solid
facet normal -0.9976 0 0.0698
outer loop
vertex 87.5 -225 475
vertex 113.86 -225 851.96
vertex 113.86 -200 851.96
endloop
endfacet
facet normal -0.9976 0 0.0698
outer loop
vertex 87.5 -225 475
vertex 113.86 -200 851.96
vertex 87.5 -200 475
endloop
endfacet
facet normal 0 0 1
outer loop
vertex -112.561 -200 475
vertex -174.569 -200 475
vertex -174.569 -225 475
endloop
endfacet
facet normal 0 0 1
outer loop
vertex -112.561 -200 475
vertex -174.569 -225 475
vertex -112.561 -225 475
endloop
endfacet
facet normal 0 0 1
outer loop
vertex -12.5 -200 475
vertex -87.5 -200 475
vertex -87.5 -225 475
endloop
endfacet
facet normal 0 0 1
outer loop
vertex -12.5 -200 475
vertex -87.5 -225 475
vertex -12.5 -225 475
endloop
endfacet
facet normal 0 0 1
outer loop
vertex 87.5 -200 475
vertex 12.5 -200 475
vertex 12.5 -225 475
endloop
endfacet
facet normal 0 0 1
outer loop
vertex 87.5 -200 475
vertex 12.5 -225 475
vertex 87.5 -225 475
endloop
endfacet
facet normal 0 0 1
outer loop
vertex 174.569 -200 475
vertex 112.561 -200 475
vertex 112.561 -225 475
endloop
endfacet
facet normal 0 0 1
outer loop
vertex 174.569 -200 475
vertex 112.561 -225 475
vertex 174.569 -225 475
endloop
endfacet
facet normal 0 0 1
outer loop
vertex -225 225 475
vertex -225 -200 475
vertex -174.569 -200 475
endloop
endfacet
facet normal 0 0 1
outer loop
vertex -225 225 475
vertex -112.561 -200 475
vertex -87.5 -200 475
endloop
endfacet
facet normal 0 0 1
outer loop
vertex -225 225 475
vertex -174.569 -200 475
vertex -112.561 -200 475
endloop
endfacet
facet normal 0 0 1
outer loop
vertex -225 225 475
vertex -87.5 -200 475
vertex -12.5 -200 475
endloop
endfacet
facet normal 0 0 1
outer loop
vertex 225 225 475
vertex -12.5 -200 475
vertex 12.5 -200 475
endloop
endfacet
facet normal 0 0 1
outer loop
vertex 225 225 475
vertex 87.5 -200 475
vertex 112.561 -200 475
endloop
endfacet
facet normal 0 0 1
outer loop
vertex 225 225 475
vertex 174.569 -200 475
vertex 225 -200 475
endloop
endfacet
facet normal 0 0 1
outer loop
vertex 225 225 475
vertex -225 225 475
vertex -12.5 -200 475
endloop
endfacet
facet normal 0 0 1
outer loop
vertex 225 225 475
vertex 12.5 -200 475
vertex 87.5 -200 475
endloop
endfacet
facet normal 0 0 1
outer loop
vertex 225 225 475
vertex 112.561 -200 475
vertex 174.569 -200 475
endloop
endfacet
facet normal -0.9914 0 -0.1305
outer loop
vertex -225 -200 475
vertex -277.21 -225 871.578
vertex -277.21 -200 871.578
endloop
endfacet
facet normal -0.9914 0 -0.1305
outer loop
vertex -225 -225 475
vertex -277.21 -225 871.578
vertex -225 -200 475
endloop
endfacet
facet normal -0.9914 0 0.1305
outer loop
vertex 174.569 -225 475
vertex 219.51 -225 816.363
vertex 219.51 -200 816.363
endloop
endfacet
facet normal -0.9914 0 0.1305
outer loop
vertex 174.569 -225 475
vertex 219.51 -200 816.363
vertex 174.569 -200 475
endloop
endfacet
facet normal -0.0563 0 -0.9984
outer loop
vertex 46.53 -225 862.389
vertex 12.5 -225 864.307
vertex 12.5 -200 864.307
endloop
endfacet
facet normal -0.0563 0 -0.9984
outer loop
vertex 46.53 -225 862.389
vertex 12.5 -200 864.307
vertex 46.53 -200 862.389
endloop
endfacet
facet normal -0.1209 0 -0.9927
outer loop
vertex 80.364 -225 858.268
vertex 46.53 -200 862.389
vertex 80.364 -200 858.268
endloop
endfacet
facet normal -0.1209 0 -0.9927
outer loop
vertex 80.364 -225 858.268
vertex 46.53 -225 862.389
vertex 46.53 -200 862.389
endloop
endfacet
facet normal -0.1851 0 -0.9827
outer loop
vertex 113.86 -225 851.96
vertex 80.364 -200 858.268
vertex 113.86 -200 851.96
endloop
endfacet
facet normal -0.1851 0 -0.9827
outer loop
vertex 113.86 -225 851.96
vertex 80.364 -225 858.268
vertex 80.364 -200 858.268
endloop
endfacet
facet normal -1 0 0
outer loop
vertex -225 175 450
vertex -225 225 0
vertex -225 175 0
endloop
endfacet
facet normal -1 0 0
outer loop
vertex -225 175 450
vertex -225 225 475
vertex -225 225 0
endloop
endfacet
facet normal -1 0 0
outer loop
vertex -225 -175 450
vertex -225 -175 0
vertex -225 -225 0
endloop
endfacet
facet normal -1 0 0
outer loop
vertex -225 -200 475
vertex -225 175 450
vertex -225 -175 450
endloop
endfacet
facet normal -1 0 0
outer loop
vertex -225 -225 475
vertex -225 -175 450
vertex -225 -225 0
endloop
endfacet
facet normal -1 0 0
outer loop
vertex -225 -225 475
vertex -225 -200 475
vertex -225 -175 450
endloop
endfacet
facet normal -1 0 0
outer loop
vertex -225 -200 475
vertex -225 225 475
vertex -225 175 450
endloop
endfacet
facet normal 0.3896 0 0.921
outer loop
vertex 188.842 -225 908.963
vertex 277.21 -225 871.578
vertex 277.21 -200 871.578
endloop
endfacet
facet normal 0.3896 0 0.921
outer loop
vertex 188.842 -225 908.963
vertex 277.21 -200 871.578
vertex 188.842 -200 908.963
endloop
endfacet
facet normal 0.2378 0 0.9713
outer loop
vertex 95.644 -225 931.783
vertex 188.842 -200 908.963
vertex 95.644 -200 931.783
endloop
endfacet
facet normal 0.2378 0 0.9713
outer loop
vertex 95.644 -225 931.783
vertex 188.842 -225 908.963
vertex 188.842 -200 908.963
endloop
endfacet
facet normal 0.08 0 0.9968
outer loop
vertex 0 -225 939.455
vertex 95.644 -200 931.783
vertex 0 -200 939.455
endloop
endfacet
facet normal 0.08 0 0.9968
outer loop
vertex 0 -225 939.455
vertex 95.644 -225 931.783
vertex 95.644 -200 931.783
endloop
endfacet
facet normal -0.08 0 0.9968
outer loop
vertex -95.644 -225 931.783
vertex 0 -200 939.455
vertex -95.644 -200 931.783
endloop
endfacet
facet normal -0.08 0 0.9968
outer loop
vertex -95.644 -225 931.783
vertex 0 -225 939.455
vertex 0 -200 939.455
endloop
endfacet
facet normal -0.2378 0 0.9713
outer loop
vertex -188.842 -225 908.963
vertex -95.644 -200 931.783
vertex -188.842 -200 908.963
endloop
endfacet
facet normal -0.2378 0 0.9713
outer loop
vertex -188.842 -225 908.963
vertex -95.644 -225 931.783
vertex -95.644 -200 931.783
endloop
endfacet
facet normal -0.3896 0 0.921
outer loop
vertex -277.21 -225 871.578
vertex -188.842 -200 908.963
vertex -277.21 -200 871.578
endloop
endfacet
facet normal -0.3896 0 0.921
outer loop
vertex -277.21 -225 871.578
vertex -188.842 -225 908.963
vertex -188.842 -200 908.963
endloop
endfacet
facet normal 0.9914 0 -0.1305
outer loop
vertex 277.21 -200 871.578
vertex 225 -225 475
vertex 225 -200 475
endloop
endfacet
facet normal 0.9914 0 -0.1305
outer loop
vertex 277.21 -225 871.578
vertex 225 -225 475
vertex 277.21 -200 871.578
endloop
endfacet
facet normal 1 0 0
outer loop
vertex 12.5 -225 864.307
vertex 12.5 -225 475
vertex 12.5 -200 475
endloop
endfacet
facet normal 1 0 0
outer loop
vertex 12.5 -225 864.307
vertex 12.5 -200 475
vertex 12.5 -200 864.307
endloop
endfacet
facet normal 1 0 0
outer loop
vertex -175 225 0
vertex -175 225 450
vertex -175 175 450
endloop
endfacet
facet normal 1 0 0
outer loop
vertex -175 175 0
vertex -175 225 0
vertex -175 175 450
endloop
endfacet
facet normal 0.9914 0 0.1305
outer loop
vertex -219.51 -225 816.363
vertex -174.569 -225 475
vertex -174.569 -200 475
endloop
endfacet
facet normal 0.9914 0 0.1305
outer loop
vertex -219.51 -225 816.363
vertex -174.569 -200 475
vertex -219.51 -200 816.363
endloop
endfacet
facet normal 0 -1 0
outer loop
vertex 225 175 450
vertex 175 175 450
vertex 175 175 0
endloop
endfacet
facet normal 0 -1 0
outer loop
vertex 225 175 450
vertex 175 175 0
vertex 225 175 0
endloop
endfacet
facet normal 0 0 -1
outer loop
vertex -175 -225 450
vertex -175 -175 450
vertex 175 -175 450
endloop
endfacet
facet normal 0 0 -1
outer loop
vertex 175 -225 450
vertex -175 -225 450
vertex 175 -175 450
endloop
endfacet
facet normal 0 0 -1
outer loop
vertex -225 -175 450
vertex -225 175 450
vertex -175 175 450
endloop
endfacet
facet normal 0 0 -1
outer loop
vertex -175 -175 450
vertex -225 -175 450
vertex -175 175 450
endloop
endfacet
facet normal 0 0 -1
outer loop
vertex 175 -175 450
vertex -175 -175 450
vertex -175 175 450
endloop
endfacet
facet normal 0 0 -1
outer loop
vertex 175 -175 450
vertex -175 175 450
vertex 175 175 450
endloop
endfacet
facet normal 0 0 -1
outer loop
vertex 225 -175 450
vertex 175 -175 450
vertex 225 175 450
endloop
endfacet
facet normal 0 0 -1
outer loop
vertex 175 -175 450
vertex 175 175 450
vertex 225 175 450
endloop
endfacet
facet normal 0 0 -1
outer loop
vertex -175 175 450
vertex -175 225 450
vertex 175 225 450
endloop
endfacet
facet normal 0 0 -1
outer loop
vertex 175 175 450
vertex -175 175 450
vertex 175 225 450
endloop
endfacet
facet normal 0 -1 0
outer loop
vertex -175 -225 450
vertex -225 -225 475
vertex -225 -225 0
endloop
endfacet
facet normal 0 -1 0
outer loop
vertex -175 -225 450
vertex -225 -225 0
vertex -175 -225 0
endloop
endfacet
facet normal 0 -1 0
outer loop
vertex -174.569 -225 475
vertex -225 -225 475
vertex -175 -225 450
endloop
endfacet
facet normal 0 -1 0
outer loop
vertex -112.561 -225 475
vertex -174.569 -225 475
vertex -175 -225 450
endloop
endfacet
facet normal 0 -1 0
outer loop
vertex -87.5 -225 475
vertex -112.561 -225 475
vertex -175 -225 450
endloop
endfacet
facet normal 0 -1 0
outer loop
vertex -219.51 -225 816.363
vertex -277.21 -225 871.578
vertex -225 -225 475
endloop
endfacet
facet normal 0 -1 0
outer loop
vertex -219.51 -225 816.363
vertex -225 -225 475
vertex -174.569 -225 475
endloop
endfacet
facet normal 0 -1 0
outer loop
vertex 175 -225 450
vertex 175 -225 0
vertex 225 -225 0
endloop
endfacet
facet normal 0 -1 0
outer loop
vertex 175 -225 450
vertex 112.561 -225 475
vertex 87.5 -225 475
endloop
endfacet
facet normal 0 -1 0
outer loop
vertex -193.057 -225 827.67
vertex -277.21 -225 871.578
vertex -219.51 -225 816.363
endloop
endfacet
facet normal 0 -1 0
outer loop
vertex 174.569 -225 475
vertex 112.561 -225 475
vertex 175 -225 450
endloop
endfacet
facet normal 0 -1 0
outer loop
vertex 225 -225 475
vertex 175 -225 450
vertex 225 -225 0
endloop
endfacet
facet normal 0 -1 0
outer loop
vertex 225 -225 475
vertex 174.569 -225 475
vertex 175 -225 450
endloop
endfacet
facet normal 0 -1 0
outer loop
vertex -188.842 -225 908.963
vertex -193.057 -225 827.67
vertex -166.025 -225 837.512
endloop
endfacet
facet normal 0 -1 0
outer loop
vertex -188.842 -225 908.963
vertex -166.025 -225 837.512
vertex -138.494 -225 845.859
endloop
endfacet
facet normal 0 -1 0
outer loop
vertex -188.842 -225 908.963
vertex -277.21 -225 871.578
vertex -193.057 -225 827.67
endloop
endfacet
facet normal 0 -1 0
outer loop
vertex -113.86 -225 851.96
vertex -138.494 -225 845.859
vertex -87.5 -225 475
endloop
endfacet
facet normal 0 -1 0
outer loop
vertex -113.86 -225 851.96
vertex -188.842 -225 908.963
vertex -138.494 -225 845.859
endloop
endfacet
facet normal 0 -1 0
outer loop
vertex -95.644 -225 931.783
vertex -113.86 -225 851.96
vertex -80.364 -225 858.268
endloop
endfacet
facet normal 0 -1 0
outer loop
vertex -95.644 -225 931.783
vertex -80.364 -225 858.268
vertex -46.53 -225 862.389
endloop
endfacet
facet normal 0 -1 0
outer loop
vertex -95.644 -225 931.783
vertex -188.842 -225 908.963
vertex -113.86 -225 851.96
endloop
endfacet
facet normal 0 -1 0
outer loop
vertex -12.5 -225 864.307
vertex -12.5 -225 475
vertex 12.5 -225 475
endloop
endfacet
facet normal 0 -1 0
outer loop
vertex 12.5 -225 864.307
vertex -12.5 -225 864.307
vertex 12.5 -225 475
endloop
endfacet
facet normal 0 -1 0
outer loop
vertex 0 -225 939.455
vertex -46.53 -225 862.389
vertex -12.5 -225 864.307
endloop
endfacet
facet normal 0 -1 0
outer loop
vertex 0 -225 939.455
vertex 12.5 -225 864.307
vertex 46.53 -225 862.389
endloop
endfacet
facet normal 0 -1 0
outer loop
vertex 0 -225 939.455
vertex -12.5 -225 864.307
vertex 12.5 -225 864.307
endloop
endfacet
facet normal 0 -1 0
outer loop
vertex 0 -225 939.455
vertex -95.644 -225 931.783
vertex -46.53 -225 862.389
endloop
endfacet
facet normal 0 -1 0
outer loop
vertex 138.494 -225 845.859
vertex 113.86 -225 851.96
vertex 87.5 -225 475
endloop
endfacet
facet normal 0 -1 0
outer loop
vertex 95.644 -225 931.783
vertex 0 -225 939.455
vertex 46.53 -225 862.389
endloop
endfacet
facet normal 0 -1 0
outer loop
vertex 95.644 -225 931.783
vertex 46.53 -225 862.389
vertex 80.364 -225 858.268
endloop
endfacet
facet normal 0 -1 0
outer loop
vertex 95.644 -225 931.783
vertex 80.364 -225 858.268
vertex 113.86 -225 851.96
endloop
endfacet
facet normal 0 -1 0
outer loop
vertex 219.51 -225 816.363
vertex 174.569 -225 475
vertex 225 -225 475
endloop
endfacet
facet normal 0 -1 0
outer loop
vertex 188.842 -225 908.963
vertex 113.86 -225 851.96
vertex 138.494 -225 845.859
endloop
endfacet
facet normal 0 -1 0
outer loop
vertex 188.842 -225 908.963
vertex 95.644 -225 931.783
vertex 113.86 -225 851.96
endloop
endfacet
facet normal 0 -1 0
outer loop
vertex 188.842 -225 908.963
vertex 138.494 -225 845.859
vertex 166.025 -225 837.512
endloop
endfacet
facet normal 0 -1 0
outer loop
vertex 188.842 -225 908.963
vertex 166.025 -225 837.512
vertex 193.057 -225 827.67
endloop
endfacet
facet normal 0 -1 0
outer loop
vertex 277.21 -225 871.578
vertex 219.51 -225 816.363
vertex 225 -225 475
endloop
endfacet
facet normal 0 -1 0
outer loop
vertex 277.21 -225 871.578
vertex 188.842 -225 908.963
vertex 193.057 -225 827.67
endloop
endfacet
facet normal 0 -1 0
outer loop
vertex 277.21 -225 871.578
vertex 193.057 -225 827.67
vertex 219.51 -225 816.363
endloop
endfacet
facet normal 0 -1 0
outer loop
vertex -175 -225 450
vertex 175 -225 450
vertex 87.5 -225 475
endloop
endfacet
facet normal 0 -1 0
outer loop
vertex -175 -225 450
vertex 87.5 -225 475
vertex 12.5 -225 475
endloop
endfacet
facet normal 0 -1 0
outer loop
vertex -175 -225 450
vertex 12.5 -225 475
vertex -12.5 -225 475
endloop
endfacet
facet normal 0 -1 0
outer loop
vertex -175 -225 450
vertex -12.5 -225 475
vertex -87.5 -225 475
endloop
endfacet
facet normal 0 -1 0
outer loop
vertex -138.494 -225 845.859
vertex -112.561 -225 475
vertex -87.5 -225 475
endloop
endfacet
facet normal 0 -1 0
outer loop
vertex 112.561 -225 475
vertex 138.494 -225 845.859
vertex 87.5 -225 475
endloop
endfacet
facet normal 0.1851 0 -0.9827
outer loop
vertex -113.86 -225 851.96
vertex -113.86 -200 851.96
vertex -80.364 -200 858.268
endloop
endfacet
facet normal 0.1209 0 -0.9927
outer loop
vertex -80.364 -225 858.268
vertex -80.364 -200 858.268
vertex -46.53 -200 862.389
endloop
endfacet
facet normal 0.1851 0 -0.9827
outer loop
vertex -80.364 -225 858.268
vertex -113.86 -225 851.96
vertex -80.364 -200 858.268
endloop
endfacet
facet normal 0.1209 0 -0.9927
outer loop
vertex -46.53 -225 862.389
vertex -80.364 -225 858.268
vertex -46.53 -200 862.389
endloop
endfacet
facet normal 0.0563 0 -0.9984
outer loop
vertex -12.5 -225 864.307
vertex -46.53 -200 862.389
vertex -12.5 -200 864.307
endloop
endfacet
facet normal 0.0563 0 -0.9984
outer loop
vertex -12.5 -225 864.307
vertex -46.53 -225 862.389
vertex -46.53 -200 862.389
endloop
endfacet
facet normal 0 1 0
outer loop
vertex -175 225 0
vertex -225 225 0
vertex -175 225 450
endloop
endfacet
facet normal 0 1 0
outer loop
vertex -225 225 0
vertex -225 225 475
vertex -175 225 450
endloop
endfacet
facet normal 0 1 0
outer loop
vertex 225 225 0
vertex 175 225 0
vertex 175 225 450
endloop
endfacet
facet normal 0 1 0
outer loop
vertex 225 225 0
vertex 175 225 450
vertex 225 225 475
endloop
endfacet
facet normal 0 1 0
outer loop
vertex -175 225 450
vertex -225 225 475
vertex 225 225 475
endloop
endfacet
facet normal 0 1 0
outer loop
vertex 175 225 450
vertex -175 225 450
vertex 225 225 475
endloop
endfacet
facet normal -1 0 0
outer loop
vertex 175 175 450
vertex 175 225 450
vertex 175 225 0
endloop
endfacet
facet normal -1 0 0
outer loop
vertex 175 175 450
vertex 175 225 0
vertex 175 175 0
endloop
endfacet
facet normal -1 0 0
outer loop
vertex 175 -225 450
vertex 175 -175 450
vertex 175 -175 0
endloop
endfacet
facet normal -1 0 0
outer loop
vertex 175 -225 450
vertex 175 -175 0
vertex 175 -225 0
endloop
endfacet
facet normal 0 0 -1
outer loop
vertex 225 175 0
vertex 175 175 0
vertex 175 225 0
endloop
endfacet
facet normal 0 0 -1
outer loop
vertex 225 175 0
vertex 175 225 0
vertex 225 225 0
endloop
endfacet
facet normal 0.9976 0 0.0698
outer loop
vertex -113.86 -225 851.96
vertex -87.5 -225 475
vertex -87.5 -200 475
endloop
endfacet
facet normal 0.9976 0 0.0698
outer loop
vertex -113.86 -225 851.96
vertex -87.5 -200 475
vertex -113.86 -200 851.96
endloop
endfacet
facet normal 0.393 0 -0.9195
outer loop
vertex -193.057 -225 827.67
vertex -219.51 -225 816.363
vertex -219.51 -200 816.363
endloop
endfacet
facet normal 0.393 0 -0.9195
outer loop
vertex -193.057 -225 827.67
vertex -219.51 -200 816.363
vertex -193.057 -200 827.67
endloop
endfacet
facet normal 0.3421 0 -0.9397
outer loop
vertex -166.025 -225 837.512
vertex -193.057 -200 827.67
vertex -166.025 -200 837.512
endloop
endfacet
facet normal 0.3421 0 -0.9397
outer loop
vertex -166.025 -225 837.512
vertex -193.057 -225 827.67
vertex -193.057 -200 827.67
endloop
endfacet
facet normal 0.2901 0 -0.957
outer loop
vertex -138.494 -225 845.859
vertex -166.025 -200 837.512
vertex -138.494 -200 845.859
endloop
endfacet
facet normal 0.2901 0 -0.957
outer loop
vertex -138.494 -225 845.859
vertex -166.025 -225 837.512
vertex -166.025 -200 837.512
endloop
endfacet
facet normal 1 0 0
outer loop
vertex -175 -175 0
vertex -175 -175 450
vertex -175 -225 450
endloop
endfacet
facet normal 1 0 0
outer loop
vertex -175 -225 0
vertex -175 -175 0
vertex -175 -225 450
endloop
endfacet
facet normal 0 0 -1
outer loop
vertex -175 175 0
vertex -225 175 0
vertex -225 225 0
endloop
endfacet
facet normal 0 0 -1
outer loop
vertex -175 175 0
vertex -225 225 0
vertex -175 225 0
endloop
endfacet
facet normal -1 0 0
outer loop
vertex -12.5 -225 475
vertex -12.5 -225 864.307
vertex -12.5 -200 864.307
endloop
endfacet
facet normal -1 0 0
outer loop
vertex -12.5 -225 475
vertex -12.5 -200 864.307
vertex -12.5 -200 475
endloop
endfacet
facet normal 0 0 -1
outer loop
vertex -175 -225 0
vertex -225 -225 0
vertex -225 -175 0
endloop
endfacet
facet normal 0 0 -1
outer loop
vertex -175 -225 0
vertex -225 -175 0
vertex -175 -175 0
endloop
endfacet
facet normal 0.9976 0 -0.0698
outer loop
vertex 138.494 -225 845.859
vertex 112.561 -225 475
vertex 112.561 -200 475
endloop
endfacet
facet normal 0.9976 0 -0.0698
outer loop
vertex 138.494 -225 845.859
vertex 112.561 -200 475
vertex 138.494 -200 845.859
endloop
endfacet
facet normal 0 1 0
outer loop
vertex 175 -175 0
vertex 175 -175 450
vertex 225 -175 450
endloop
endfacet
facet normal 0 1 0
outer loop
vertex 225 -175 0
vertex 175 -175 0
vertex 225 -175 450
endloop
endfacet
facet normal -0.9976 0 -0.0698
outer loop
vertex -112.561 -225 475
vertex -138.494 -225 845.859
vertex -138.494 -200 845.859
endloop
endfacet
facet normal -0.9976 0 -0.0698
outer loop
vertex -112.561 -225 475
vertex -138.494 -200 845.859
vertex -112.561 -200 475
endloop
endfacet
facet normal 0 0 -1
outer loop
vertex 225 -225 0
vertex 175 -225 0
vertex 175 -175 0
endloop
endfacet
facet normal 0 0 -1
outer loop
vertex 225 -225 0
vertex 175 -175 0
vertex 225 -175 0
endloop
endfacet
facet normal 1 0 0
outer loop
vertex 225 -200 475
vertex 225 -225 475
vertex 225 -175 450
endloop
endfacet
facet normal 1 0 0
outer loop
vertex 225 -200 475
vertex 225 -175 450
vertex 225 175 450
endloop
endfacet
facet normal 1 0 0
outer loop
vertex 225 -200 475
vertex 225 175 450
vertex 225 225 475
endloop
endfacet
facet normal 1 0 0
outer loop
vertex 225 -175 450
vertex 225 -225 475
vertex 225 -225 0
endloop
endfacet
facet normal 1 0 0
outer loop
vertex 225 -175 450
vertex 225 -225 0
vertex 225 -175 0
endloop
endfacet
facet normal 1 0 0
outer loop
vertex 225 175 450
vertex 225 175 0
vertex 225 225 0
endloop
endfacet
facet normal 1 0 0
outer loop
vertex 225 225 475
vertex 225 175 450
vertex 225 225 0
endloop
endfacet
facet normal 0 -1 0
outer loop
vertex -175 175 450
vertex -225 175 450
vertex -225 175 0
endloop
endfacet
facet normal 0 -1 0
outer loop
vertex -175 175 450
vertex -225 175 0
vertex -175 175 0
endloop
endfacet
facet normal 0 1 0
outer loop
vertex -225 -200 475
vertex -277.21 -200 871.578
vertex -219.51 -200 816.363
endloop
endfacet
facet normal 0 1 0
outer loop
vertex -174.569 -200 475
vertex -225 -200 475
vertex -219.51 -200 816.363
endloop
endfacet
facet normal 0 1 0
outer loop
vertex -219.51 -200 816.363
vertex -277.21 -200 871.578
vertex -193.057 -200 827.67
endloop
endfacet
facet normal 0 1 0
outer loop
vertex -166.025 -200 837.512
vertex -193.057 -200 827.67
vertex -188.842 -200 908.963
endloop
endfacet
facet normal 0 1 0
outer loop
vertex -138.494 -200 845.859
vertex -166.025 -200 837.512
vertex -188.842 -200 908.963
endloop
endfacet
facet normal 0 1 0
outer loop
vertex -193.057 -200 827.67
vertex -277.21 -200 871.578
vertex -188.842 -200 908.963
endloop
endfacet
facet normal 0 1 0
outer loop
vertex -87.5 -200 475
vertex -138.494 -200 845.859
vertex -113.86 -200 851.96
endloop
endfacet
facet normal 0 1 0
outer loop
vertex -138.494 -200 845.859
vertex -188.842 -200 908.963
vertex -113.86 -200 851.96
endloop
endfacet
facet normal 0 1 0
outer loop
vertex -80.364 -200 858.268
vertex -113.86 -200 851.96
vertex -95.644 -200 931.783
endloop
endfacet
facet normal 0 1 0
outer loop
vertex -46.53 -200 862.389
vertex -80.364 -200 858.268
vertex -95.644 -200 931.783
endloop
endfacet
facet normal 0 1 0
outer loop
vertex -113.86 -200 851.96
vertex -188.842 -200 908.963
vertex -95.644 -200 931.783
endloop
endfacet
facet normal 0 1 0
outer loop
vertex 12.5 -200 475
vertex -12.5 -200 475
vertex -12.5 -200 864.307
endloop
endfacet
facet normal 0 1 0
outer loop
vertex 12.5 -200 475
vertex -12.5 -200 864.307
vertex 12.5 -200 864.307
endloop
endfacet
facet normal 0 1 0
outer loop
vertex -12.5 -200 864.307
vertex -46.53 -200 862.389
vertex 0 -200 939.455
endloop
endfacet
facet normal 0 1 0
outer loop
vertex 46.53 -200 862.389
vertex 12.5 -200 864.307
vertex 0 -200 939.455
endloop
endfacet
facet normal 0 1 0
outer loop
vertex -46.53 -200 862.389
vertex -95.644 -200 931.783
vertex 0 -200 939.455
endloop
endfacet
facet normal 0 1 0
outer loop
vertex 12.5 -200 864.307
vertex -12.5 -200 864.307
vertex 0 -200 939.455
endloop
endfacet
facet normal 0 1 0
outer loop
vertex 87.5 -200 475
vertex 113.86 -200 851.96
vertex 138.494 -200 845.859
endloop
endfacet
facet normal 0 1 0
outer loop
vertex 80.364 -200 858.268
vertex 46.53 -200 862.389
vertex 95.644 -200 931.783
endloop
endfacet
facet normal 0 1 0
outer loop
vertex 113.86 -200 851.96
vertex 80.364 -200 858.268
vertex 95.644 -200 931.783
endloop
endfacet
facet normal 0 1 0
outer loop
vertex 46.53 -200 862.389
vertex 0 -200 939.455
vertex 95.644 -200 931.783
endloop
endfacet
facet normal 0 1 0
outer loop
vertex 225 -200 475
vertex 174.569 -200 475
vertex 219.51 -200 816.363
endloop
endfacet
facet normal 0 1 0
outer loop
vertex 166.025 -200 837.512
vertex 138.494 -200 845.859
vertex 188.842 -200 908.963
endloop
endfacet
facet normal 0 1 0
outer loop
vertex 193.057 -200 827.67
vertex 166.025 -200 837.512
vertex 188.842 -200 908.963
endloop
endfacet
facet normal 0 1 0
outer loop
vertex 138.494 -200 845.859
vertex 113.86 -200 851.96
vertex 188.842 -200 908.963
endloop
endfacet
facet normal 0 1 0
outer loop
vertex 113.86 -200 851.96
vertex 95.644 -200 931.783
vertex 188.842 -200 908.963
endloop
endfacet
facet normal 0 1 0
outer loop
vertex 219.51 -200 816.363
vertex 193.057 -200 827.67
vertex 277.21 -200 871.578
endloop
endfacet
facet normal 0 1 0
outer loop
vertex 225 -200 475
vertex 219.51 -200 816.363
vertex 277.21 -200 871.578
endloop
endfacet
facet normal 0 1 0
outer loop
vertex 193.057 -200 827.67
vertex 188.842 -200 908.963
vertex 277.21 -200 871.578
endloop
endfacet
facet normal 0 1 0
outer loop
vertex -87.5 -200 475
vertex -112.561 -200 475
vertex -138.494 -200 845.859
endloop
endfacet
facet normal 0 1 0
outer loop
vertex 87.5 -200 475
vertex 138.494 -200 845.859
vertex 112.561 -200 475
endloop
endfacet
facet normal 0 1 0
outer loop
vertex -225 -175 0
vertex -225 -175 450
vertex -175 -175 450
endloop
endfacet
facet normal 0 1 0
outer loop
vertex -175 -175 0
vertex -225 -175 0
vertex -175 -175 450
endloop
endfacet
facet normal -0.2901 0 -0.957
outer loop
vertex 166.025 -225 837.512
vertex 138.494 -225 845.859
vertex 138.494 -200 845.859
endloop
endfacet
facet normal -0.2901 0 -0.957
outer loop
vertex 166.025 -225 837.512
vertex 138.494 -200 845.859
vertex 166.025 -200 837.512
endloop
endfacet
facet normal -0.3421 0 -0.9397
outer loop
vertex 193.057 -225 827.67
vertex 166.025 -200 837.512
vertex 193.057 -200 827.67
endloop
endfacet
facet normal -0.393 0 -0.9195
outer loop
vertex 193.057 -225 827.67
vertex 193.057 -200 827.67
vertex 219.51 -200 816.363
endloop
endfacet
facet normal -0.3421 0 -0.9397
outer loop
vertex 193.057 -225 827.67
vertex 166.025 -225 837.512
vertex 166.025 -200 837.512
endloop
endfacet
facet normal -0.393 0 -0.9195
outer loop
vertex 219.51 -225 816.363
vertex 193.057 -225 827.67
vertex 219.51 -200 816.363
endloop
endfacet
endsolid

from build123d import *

# Parameters (mm, degrees)
F1_W     = 450
F1_H     = 450
F2_DEPTH = 25
F3_W     = 50
F3_H     = 50
F4_DEPTH = 450
F6_DEPTH = 25
F8_DEPTH = 25


with BuildPart() as f2:
    # F1 (on offset) → F2 (new body)
    with BuildSketch(Plane.XY.offset(450)):
        Rectangle(F1_W, F1_H)
    extrude(amount=F2_DEPTH)

    # F3 (on face) → F4 (join, through all)
    with BuildSketch(Plane(origin=(0, 0, 450), x_dir=(1, 0, 0), z_dir=(0, 0, -1))):
        with Locations((-200, -200)):
            Rectangle(F3_W, F3_H)
        with Locations((-200, 200)):
            Rectangle(F3_W, F3_H)
        with Locations((200, -200)):
            Rectangle(F3_W, F3_H)
        with Locations((200, 200)):
            Rectangle(F3_W, F3_H)
    extrude(amount=F4_DEPTH)

    # F5 (on face) → F6 (join)
    with BuildSketch(Plane.XZ.offset(225)):
        with BuildLine():
            Line((-277.210476888, 871.5779445495), (-225, 475))
            Line((-225, 475), (-174.568551971, 475))
            Line((-174.568551971, 475), (-219.5097934393, 816.3626197141))
            ThreePointArc((-219.5097934393, 816.3626197141), (0, 864.4554478408), (219.5097934393, 816.3626197141))
            Line((219.5097934393, 816.3626197141), (174.568551971, 475))
            Line((174.568551971, 475), (225, 475))
            Line((225, 475), (277.210476888, 871.5779445495))
            ThreePointArc((277.210476888, 871.5779445495), (0, 939.4554478408), (-277.210476888, 871.5779445495))
        make_face()
    extrude(amount=-F6_DEPTH)

    # F7 (on face) → F8 (join)
    with BuildSketch(Plane.XZ.offset(225)):
        with BuildLine():
            ThreePointArc((12.5, 864.3066172212), (0, 864.4554478408), (-12.5, 864.3066172212))
            Line((-12.5, 864.3066172212), (-12.5, 475))
            Line((-12.5, 475), (12.5, 475))
            Line((12.5, 475), (12.5, 864.3066172212))
        make_face()
        with BuildLine():
            Line((-140.2890822889, 871.5293721566), (-112.561047452, 475))
            Line((-112.561047452, 475), (-87.5, 475))
            Line((-87.5, 475), (-115.6574592783, 877.6704277765))
            ThreePointArc((-115.6574592783, 877.6704277765), (-127.9664582867, 874.5725752089), (-140.2890822889, 871.5293721566))
        make_face()
        with BuildLine():
            Line((87.5, 475), (112.561047452, 475))
            Line((112.561047452, 475), (140.2890822889, 871.5293721566))
            ThreePointArc((140.2890822889, 871.5293721566), (127.9664582867, 874.5725752089), (115.6574592783, 877.6704277765))
            Line((115.6574592783, 877.6704277765), (87.5, 475))
        make_face()
    extrude(amount=-F8_DEPTH)


solid = f2.part
